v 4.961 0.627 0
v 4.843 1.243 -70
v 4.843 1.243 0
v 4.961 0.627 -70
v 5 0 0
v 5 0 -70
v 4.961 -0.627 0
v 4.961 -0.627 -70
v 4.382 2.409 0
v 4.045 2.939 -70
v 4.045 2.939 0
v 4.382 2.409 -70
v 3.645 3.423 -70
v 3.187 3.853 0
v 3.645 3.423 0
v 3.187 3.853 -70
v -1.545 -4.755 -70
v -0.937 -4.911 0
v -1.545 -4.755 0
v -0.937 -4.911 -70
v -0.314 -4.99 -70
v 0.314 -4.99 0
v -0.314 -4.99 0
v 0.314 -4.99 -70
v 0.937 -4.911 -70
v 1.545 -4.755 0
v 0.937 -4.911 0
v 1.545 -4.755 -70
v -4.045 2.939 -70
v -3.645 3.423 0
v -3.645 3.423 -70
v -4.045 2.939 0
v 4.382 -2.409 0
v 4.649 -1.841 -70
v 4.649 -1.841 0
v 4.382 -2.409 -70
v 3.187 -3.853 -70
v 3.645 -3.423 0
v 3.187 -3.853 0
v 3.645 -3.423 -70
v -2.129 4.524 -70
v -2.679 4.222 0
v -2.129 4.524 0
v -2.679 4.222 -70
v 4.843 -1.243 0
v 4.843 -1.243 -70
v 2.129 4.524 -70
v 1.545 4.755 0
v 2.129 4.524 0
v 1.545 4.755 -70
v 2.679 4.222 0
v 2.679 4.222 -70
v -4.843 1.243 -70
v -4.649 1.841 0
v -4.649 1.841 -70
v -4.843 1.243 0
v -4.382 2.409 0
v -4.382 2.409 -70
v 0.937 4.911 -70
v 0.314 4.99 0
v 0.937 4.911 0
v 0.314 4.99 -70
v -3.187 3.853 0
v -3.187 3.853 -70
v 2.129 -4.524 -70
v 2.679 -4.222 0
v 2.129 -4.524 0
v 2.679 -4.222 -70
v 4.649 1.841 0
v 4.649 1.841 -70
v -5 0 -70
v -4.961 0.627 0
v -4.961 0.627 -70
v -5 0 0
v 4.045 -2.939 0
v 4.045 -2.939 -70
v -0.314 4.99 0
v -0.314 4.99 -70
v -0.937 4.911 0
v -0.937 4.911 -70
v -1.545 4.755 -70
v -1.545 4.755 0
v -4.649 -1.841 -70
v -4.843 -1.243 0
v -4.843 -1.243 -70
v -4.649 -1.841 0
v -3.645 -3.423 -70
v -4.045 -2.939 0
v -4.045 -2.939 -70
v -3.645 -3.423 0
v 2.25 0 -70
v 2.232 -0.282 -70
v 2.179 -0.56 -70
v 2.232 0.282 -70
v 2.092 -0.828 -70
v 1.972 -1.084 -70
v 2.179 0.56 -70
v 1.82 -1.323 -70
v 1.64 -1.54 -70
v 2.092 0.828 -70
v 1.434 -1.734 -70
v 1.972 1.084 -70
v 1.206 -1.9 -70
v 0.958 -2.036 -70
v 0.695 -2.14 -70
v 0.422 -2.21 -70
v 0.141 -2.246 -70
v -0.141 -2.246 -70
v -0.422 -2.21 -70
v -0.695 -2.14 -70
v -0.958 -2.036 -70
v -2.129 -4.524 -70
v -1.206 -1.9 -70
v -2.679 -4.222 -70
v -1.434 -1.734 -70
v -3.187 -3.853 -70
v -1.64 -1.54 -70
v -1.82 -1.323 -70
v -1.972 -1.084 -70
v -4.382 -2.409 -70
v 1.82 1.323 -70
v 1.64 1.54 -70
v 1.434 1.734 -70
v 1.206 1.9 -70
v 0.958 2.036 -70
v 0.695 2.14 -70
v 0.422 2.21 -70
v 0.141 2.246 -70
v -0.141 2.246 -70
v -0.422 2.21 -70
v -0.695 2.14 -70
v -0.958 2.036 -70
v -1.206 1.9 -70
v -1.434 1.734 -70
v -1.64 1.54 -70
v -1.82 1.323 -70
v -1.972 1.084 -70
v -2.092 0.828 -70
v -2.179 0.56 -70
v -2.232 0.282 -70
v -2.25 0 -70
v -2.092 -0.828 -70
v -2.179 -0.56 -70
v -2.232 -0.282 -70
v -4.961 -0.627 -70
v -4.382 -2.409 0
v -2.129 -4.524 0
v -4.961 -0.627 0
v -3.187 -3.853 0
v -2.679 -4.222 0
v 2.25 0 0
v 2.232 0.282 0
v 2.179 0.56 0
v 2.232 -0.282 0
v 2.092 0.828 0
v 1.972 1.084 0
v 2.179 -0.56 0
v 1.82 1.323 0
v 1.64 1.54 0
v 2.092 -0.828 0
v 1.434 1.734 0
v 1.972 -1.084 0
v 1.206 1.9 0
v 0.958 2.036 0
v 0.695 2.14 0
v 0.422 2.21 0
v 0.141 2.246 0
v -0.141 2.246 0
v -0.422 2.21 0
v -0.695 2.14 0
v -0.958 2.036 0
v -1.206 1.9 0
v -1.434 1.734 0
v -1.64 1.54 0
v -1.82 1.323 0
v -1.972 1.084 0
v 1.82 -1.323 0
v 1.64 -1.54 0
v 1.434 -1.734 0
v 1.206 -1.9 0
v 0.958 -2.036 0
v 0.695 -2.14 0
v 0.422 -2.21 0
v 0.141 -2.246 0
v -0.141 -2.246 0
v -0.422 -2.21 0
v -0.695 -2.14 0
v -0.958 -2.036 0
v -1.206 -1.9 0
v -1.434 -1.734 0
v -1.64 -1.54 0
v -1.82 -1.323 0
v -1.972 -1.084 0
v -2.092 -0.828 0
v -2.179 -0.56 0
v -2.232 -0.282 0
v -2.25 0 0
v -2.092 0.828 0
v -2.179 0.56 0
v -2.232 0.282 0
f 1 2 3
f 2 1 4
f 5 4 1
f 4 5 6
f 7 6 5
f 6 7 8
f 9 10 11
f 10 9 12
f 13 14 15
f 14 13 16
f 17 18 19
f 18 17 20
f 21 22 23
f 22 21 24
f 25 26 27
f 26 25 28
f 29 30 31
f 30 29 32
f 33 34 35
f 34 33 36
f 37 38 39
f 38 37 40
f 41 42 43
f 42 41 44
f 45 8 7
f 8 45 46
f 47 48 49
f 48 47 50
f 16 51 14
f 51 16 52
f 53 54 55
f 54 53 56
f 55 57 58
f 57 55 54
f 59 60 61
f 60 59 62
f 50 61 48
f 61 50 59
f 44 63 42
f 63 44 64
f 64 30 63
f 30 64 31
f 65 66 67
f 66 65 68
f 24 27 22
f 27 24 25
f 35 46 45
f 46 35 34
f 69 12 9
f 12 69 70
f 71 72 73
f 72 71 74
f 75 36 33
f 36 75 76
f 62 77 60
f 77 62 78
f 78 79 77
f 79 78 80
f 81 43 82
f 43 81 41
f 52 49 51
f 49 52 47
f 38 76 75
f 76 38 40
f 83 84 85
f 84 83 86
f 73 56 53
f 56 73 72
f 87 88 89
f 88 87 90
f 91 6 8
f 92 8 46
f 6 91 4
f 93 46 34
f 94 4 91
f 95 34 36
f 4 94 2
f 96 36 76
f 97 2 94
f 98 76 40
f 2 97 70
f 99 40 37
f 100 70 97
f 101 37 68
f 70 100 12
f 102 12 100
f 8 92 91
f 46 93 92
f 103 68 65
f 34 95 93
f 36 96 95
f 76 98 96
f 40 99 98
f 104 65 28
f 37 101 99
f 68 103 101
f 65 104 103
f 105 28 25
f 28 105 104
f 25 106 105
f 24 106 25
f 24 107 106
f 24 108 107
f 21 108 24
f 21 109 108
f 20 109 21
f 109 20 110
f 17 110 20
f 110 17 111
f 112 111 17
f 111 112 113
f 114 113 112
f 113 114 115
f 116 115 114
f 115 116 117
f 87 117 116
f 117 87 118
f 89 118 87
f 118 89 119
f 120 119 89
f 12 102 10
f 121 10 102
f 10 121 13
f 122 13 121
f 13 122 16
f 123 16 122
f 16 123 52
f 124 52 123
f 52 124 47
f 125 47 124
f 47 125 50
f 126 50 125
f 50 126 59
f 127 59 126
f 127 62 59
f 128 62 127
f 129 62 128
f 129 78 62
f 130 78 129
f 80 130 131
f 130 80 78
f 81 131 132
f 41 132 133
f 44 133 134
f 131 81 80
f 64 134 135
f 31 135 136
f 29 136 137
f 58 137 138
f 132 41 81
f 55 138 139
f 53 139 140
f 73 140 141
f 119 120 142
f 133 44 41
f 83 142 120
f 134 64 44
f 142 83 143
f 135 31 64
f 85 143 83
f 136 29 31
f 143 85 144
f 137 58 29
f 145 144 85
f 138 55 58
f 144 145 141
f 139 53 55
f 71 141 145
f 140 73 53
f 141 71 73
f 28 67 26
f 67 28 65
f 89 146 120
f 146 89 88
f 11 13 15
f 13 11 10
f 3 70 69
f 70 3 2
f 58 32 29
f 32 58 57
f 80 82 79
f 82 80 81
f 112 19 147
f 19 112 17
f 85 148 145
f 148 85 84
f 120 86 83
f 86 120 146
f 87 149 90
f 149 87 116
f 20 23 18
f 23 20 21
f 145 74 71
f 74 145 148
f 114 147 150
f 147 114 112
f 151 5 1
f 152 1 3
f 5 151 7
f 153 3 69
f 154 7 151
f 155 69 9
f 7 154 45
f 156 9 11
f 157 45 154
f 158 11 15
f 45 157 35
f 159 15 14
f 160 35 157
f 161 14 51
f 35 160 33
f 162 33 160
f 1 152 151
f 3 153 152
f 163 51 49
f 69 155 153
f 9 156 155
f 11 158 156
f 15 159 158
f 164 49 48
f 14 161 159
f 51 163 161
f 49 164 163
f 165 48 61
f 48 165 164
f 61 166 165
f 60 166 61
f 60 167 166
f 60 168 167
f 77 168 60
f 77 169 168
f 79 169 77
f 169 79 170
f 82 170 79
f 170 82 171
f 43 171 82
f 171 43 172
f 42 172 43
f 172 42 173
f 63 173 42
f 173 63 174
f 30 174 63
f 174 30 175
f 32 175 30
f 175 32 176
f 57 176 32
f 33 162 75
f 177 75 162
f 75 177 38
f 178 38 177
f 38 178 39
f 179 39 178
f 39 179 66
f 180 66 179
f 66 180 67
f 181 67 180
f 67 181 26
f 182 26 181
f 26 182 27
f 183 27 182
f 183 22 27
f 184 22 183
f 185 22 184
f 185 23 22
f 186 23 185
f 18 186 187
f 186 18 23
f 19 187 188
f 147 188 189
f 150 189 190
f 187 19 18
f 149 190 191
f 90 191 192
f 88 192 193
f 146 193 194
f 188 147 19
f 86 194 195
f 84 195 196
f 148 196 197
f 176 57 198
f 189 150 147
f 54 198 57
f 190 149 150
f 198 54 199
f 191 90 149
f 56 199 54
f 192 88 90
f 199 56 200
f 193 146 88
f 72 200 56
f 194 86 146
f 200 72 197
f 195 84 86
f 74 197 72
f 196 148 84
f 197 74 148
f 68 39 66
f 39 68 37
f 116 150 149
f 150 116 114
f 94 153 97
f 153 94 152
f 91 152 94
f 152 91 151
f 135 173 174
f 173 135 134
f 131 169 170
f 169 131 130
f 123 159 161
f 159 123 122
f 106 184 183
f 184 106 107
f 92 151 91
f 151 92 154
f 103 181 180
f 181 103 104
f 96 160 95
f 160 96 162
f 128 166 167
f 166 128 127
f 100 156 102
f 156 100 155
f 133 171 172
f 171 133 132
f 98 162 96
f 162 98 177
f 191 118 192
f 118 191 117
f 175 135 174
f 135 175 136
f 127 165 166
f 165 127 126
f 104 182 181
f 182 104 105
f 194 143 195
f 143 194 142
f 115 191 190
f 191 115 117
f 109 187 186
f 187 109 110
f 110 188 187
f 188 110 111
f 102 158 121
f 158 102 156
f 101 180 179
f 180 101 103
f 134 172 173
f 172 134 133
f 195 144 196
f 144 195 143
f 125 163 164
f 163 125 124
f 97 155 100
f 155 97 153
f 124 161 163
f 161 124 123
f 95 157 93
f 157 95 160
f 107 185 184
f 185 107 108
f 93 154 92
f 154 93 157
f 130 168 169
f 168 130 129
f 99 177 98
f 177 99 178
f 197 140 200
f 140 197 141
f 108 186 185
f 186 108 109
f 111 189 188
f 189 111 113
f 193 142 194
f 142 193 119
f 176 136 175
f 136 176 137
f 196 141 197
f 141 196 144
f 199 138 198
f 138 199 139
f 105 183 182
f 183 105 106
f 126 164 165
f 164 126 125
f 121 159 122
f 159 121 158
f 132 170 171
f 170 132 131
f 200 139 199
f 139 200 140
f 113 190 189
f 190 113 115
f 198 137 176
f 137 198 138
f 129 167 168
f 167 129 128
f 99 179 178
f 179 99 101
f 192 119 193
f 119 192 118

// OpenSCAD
$fn = 50;


difference() {
	union() {
		translate(v = [0, 0, -70.0000000000]) {
			cylinder(h = 70, r = 5.0000000000);
		}
		cylinder(h = 0, r = 8.0000000000);
	}
	union() {
		#translate(v = [0, 0, -70]) {
			cylinder(h = 70, r = 2.2500000000);
		}
	}
}
